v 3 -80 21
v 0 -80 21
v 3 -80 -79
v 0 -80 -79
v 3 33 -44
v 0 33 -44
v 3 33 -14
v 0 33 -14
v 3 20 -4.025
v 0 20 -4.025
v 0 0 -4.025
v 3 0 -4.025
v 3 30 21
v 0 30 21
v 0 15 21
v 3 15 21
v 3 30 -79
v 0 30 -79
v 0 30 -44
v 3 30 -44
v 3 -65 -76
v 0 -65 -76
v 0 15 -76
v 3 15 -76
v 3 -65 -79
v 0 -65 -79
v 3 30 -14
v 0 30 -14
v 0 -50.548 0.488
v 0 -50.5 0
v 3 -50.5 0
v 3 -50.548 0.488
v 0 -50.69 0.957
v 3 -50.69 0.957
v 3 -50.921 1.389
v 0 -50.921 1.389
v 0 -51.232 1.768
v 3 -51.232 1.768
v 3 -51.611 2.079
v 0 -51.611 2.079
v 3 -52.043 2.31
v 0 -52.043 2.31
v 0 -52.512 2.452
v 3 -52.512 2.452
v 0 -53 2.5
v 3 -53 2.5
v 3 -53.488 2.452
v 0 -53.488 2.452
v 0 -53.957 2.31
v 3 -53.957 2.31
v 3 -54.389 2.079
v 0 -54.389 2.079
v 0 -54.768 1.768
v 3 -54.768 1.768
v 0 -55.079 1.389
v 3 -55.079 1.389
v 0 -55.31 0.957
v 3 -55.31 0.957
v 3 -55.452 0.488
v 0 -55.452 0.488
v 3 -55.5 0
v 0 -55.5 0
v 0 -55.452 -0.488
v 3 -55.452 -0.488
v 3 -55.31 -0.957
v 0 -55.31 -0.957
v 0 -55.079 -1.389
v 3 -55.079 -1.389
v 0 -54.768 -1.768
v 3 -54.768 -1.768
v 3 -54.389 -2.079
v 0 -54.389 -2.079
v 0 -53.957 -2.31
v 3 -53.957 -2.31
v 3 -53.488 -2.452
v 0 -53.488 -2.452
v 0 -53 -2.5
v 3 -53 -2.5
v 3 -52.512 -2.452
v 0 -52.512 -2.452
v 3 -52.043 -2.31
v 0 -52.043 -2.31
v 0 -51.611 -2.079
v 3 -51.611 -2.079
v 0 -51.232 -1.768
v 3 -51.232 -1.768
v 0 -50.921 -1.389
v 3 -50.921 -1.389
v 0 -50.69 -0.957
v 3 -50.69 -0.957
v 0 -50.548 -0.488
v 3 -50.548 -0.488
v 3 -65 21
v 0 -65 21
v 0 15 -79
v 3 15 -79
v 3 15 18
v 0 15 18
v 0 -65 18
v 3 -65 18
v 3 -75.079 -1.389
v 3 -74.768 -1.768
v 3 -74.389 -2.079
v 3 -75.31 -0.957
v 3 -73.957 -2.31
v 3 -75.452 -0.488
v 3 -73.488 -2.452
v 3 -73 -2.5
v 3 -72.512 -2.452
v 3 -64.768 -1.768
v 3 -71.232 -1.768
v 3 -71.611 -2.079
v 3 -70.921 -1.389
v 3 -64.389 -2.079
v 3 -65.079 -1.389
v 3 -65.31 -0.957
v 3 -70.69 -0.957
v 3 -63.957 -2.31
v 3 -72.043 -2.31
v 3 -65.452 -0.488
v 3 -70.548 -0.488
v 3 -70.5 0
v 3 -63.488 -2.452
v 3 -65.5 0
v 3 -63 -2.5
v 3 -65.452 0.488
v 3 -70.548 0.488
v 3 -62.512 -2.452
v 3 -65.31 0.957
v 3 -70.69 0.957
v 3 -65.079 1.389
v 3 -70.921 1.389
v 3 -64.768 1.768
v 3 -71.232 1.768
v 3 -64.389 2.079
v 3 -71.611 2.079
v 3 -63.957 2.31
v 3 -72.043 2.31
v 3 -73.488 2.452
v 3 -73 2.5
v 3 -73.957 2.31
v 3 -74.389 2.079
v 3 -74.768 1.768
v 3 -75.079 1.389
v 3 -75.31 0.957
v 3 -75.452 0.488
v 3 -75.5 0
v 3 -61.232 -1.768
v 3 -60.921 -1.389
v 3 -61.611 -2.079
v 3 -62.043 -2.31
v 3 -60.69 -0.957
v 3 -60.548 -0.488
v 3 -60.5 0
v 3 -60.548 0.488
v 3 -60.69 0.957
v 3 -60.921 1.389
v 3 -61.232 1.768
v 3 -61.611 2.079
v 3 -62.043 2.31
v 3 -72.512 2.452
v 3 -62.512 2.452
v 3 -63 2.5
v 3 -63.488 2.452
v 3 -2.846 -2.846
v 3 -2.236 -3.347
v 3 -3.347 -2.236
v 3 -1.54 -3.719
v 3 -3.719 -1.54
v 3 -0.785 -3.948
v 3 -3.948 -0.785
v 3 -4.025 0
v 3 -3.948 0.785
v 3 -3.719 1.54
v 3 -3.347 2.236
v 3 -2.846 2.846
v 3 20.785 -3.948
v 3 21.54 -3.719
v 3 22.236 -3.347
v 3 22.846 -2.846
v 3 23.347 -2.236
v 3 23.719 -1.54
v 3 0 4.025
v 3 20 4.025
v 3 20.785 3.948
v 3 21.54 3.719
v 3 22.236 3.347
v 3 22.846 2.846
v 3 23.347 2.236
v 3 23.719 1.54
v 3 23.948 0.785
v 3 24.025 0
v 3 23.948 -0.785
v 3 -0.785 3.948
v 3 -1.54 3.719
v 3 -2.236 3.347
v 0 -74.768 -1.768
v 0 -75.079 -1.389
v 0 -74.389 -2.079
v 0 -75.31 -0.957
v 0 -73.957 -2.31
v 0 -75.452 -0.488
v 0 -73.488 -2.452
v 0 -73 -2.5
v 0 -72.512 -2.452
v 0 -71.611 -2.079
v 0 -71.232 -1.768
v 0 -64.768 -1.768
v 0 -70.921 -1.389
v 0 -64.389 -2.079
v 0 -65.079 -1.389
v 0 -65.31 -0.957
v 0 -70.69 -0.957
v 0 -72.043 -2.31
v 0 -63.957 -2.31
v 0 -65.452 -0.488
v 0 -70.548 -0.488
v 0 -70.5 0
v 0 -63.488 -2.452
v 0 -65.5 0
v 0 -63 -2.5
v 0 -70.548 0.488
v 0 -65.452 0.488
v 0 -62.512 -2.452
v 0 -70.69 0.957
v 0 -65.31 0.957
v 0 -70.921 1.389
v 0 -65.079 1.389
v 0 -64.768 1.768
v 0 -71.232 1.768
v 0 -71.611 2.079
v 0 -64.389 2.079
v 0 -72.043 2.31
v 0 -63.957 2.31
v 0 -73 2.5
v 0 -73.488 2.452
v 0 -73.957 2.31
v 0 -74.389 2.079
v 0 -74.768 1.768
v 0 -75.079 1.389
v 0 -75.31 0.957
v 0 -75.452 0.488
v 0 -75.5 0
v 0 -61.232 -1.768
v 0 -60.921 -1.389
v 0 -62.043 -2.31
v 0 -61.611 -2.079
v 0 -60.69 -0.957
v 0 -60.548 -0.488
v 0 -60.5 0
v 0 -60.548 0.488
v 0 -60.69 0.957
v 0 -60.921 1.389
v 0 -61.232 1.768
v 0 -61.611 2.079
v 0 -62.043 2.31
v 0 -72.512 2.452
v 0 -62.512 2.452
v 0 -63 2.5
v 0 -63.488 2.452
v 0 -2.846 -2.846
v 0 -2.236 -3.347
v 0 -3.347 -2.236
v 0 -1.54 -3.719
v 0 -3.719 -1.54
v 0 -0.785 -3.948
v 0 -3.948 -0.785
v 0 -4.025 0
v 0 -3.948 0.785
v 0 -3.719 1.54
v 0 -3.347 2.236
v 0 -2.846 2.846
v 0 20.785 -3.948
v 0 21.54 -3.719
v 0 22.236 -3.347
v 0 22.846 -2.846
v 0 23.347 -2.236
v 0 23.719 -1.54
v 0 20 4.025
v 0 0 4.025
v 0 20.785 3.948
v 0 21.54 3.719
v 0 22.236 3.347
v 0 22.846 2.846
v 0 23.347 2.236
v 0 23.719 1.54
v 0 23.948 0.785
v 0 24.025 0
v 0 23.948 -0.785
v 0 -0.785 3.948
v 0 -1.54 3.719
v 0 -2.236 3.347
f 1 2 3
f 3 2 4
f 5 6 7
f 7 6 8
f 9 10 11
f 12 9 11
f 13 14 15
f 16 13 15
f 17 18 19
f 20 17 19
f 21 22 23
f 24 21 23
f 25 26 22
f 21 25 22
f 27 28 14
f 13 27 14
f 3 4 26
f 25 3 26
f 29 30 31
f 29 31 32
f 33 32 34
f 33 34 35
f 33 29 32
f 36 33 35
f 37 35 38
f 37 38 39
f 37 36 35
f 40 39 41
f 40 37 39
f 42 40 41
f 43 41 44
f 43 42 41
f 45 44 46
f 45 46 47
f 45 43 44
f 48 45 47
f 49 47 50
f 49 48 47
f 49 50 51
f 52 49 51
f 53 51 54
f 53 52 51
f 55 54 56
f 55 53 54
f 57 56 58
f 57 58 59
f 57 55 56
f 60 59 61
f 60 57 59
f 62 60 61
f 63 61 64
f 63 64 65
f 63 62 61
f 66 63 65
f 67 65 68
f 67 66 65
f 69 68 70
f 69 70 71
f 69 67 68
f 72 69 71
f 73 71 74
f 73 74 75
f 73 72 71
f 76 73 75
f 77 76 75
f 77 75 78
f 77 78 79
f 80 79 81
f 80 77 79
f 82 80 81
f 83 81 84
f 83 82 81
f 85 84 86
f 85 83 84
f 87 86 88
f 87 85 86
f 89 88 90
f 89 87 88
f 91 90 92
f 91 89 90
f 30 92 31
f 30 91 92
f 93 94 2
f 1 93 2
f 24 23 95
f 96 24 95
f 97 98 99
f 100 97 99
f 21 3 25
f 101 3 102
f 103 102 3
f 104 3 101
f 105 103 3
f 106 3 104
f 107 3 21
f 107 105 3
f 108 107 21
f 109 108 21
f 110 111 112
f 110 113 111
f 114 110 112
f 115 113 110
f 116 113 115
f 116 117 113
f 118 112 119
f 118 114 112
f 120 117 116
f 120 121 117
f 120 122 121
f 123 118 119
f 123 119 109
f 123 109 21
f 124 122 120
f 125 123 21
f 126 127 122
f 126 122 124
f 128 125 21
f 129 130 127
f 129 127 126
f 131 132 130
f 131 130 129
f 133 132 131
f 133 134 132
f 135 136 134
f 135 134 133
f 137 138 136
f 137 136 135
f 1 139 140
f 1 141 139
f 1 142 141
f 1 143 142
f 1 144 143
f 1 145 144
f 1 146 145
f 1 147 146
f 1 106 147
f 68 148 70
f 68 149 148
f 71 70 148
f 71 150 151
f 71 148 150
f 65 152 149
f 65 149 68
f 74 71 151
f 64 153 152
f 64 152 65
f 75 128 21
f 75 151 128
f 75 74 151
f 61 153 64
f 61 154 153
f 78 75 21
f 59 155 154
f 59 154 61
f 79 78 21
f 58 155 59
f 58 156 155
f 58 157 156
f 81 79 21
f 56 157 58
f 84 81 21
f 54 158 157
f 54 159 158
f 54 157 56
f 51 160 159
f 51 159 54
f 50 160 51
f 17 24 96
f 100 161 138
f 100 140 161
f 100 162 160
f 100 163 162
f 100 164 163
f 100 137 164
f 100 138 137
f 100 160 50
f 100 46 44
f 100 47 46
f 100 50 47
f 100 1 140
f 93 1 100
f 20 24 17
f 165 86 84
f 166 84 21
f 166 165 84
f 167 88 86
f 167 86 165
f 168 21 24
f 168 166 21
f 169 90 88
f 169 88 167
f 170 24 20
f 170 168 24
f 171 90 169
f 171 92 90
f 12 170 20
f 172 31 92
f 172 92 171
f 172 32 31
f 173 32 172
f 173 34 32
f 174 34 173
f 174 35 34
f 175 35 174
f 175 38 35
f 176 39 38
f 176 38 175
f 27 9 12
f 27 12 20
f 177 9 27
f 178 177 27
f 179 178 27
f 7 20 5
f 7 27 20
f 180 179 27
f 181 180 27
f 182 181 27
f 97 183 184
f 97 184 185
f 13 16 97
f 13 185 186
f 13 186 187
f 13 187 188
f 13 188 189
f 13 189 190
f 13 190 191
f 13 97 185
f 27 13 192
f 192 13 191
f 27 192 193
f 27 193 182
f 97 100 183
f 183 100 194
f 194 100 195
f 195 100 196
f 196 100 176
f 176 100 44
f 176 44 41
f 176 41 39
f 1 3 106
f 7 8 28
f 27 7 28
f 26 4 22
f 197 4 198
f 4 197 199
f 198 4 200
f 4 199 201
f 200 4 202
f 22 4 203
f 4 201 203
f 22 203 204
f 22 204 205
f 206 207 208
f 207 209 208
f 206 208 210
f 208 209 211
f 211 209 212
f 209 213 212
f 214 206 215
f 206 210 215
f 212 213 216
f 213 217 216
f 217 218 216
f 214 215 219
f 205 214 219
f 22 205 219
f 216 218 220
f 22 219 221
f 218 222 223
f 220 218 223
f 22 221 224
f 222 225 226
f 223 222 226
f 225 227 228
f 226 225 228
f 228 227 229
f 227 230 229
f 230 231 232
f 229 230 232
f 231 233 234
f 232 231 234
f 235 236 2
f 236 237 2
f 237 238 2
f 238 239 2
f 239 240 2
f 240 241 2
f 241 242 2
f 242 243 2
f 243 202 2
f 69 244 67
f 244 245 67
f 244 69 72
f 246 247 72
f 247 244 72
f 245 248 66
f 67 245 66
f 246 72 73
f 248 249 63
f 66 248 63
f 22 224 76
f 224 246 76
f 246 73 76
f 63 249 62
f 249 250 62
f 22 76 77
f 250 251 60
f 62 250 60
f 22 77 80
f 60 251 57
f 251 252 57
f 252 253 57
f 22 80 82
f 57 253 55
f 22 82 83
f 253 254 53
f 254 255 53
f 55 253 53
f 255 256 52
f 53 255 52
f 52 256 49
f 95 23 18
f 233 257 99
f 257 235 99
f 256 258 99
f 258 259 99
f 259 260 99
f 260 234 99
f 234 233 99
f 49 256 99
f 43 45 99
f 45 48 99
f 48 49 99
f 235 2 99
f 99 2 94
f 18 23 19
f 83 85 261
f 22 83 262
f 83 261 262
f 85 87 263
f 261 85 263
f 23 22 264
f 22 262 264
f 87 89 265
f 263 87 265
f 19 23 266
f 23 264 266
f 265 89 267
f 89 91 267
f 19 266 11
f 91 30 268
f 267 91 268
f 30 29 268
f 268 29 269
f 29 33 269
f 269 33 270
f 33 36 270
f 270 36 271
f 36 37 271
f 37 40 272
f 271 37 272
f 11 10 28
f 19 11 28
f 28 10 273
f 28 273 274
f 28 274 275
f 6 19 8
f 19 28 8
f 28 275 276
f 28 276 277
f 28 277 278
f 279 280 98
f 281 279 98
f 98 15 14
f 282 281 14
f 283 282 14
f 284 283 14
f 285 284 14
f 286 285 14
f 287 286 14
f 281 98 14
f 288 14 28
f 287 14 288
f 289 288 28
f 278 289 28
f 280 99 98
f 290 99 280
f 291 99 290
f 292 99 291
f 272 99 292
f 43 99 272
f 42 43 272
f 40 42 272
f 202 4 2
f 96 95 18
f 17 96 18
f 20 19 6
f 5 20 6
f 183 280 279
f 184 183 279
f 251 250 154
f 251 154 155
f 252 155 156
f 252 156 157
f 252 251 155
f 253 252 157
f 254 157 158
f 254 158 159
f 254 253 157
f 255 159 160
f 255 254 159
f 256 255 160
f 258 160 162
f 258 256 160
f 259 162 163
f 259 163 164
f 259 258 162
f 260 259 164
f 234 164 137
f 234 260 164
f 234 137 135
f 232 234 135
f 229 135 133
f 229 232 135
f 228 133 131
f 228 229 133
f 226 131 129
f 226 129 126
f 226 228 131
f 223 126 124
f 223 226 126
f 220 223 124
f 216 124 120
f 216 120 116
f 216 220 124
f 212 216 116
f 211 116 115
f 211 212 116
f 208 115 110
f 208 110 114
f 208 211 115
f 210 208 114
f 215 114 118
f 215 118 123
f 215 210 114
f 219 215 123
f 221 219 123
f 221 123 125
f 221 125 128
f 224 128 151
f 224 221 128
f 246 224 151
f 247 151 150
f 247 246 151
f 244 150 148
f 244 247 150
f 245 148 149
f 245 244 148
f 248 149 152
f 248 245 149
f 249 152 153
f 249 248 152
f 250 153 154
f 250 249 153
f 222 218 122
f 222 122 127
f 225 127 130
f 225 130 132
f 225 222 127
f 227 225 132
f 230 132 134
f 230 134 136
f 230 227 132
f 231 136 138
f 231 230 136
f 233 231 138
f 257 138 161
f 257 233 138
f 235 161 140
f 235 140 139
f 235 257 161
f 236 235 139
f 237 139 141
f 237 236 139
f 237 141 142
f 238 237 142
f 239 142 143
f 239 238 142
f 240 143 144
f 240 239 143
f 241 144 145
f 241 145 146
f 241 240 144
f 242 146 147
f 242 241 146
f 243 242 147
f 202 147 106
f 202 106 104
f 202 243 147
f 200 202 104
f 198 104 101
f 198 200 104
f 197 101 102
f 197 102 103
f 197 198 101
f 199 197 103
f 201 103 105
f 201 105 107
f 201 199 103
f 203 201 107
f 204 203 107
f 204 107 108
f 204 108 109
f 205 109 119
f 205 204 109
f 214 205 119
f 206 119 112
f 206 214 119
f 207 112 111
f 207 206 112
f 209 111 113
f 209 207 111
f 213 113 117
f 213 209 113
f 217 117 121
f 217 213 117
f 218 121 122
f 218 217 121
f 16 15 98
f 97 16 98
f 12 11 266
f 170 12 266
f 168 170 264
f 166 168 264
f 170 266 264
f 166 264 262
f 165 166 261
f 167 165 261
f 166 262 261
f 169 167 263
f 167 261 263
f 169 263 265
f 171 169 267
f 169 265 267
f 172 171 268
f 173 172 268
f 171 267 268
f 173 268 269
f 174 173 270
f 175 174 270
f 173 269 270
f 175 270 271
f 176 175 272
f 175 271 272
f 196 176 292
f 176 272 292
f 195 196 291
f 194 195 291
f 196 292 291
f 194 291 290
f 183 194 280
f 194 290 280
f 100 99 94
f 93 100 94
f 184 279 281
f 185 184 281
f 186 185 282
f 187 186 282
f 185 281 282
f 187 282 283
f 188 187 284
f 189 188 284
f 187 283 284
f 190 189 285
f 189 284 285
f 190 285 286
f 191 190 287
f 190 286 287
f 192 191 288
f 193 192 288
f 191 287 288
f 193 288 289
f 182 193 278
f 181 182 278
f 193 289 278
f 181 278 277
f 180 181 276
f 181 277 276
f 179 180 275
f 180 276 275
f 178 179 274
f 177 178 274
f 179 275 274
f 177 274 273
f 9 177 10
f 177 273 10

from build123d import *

# Parameters (mm, degrees)
F0_R     = 2.5
F1_DEPTH = 3


with BuildPart() as f1:
    # F0 (on Right) → F1 (new body)
    with BuildSketch(Plane.YZ):
        Polygon((30, -14), (30, 21), (15, 21), (15, 18), (-65, 18), (-65, 21), (-80, 21), (-80, -79), (-65, -79), (-65, -76), (15, -76), (15, -79), (30, -79), (30, -44), (33, -44), (33, -14), align=None)
        with Locations((-73, 0)):
            Circle(F0_R, mode=Mode.SUBTRACT)
        with Locations((-63, 0)):
            Circle(F0_R, mode=Mode.SUBTRACT)
        with Locations((-53, 0)):
            Circle(F0_R, mode=Mode.SUBTRACT)
        with BuildLine():
            Line((0, 4.025), (20, 4.025))
            ThreePointArc((20, 4.025), (24.025, 0), (20, -4.025))
            Line((20, -4.025), (0, -4.025))
            ThreePointArc((0, -4.025), (-4.025, 0), (0, 4.025))
        make_face(mode=Mode.SUBTRACT)
    extrude(amount=F1_DEPTH)


solid = f1.part
